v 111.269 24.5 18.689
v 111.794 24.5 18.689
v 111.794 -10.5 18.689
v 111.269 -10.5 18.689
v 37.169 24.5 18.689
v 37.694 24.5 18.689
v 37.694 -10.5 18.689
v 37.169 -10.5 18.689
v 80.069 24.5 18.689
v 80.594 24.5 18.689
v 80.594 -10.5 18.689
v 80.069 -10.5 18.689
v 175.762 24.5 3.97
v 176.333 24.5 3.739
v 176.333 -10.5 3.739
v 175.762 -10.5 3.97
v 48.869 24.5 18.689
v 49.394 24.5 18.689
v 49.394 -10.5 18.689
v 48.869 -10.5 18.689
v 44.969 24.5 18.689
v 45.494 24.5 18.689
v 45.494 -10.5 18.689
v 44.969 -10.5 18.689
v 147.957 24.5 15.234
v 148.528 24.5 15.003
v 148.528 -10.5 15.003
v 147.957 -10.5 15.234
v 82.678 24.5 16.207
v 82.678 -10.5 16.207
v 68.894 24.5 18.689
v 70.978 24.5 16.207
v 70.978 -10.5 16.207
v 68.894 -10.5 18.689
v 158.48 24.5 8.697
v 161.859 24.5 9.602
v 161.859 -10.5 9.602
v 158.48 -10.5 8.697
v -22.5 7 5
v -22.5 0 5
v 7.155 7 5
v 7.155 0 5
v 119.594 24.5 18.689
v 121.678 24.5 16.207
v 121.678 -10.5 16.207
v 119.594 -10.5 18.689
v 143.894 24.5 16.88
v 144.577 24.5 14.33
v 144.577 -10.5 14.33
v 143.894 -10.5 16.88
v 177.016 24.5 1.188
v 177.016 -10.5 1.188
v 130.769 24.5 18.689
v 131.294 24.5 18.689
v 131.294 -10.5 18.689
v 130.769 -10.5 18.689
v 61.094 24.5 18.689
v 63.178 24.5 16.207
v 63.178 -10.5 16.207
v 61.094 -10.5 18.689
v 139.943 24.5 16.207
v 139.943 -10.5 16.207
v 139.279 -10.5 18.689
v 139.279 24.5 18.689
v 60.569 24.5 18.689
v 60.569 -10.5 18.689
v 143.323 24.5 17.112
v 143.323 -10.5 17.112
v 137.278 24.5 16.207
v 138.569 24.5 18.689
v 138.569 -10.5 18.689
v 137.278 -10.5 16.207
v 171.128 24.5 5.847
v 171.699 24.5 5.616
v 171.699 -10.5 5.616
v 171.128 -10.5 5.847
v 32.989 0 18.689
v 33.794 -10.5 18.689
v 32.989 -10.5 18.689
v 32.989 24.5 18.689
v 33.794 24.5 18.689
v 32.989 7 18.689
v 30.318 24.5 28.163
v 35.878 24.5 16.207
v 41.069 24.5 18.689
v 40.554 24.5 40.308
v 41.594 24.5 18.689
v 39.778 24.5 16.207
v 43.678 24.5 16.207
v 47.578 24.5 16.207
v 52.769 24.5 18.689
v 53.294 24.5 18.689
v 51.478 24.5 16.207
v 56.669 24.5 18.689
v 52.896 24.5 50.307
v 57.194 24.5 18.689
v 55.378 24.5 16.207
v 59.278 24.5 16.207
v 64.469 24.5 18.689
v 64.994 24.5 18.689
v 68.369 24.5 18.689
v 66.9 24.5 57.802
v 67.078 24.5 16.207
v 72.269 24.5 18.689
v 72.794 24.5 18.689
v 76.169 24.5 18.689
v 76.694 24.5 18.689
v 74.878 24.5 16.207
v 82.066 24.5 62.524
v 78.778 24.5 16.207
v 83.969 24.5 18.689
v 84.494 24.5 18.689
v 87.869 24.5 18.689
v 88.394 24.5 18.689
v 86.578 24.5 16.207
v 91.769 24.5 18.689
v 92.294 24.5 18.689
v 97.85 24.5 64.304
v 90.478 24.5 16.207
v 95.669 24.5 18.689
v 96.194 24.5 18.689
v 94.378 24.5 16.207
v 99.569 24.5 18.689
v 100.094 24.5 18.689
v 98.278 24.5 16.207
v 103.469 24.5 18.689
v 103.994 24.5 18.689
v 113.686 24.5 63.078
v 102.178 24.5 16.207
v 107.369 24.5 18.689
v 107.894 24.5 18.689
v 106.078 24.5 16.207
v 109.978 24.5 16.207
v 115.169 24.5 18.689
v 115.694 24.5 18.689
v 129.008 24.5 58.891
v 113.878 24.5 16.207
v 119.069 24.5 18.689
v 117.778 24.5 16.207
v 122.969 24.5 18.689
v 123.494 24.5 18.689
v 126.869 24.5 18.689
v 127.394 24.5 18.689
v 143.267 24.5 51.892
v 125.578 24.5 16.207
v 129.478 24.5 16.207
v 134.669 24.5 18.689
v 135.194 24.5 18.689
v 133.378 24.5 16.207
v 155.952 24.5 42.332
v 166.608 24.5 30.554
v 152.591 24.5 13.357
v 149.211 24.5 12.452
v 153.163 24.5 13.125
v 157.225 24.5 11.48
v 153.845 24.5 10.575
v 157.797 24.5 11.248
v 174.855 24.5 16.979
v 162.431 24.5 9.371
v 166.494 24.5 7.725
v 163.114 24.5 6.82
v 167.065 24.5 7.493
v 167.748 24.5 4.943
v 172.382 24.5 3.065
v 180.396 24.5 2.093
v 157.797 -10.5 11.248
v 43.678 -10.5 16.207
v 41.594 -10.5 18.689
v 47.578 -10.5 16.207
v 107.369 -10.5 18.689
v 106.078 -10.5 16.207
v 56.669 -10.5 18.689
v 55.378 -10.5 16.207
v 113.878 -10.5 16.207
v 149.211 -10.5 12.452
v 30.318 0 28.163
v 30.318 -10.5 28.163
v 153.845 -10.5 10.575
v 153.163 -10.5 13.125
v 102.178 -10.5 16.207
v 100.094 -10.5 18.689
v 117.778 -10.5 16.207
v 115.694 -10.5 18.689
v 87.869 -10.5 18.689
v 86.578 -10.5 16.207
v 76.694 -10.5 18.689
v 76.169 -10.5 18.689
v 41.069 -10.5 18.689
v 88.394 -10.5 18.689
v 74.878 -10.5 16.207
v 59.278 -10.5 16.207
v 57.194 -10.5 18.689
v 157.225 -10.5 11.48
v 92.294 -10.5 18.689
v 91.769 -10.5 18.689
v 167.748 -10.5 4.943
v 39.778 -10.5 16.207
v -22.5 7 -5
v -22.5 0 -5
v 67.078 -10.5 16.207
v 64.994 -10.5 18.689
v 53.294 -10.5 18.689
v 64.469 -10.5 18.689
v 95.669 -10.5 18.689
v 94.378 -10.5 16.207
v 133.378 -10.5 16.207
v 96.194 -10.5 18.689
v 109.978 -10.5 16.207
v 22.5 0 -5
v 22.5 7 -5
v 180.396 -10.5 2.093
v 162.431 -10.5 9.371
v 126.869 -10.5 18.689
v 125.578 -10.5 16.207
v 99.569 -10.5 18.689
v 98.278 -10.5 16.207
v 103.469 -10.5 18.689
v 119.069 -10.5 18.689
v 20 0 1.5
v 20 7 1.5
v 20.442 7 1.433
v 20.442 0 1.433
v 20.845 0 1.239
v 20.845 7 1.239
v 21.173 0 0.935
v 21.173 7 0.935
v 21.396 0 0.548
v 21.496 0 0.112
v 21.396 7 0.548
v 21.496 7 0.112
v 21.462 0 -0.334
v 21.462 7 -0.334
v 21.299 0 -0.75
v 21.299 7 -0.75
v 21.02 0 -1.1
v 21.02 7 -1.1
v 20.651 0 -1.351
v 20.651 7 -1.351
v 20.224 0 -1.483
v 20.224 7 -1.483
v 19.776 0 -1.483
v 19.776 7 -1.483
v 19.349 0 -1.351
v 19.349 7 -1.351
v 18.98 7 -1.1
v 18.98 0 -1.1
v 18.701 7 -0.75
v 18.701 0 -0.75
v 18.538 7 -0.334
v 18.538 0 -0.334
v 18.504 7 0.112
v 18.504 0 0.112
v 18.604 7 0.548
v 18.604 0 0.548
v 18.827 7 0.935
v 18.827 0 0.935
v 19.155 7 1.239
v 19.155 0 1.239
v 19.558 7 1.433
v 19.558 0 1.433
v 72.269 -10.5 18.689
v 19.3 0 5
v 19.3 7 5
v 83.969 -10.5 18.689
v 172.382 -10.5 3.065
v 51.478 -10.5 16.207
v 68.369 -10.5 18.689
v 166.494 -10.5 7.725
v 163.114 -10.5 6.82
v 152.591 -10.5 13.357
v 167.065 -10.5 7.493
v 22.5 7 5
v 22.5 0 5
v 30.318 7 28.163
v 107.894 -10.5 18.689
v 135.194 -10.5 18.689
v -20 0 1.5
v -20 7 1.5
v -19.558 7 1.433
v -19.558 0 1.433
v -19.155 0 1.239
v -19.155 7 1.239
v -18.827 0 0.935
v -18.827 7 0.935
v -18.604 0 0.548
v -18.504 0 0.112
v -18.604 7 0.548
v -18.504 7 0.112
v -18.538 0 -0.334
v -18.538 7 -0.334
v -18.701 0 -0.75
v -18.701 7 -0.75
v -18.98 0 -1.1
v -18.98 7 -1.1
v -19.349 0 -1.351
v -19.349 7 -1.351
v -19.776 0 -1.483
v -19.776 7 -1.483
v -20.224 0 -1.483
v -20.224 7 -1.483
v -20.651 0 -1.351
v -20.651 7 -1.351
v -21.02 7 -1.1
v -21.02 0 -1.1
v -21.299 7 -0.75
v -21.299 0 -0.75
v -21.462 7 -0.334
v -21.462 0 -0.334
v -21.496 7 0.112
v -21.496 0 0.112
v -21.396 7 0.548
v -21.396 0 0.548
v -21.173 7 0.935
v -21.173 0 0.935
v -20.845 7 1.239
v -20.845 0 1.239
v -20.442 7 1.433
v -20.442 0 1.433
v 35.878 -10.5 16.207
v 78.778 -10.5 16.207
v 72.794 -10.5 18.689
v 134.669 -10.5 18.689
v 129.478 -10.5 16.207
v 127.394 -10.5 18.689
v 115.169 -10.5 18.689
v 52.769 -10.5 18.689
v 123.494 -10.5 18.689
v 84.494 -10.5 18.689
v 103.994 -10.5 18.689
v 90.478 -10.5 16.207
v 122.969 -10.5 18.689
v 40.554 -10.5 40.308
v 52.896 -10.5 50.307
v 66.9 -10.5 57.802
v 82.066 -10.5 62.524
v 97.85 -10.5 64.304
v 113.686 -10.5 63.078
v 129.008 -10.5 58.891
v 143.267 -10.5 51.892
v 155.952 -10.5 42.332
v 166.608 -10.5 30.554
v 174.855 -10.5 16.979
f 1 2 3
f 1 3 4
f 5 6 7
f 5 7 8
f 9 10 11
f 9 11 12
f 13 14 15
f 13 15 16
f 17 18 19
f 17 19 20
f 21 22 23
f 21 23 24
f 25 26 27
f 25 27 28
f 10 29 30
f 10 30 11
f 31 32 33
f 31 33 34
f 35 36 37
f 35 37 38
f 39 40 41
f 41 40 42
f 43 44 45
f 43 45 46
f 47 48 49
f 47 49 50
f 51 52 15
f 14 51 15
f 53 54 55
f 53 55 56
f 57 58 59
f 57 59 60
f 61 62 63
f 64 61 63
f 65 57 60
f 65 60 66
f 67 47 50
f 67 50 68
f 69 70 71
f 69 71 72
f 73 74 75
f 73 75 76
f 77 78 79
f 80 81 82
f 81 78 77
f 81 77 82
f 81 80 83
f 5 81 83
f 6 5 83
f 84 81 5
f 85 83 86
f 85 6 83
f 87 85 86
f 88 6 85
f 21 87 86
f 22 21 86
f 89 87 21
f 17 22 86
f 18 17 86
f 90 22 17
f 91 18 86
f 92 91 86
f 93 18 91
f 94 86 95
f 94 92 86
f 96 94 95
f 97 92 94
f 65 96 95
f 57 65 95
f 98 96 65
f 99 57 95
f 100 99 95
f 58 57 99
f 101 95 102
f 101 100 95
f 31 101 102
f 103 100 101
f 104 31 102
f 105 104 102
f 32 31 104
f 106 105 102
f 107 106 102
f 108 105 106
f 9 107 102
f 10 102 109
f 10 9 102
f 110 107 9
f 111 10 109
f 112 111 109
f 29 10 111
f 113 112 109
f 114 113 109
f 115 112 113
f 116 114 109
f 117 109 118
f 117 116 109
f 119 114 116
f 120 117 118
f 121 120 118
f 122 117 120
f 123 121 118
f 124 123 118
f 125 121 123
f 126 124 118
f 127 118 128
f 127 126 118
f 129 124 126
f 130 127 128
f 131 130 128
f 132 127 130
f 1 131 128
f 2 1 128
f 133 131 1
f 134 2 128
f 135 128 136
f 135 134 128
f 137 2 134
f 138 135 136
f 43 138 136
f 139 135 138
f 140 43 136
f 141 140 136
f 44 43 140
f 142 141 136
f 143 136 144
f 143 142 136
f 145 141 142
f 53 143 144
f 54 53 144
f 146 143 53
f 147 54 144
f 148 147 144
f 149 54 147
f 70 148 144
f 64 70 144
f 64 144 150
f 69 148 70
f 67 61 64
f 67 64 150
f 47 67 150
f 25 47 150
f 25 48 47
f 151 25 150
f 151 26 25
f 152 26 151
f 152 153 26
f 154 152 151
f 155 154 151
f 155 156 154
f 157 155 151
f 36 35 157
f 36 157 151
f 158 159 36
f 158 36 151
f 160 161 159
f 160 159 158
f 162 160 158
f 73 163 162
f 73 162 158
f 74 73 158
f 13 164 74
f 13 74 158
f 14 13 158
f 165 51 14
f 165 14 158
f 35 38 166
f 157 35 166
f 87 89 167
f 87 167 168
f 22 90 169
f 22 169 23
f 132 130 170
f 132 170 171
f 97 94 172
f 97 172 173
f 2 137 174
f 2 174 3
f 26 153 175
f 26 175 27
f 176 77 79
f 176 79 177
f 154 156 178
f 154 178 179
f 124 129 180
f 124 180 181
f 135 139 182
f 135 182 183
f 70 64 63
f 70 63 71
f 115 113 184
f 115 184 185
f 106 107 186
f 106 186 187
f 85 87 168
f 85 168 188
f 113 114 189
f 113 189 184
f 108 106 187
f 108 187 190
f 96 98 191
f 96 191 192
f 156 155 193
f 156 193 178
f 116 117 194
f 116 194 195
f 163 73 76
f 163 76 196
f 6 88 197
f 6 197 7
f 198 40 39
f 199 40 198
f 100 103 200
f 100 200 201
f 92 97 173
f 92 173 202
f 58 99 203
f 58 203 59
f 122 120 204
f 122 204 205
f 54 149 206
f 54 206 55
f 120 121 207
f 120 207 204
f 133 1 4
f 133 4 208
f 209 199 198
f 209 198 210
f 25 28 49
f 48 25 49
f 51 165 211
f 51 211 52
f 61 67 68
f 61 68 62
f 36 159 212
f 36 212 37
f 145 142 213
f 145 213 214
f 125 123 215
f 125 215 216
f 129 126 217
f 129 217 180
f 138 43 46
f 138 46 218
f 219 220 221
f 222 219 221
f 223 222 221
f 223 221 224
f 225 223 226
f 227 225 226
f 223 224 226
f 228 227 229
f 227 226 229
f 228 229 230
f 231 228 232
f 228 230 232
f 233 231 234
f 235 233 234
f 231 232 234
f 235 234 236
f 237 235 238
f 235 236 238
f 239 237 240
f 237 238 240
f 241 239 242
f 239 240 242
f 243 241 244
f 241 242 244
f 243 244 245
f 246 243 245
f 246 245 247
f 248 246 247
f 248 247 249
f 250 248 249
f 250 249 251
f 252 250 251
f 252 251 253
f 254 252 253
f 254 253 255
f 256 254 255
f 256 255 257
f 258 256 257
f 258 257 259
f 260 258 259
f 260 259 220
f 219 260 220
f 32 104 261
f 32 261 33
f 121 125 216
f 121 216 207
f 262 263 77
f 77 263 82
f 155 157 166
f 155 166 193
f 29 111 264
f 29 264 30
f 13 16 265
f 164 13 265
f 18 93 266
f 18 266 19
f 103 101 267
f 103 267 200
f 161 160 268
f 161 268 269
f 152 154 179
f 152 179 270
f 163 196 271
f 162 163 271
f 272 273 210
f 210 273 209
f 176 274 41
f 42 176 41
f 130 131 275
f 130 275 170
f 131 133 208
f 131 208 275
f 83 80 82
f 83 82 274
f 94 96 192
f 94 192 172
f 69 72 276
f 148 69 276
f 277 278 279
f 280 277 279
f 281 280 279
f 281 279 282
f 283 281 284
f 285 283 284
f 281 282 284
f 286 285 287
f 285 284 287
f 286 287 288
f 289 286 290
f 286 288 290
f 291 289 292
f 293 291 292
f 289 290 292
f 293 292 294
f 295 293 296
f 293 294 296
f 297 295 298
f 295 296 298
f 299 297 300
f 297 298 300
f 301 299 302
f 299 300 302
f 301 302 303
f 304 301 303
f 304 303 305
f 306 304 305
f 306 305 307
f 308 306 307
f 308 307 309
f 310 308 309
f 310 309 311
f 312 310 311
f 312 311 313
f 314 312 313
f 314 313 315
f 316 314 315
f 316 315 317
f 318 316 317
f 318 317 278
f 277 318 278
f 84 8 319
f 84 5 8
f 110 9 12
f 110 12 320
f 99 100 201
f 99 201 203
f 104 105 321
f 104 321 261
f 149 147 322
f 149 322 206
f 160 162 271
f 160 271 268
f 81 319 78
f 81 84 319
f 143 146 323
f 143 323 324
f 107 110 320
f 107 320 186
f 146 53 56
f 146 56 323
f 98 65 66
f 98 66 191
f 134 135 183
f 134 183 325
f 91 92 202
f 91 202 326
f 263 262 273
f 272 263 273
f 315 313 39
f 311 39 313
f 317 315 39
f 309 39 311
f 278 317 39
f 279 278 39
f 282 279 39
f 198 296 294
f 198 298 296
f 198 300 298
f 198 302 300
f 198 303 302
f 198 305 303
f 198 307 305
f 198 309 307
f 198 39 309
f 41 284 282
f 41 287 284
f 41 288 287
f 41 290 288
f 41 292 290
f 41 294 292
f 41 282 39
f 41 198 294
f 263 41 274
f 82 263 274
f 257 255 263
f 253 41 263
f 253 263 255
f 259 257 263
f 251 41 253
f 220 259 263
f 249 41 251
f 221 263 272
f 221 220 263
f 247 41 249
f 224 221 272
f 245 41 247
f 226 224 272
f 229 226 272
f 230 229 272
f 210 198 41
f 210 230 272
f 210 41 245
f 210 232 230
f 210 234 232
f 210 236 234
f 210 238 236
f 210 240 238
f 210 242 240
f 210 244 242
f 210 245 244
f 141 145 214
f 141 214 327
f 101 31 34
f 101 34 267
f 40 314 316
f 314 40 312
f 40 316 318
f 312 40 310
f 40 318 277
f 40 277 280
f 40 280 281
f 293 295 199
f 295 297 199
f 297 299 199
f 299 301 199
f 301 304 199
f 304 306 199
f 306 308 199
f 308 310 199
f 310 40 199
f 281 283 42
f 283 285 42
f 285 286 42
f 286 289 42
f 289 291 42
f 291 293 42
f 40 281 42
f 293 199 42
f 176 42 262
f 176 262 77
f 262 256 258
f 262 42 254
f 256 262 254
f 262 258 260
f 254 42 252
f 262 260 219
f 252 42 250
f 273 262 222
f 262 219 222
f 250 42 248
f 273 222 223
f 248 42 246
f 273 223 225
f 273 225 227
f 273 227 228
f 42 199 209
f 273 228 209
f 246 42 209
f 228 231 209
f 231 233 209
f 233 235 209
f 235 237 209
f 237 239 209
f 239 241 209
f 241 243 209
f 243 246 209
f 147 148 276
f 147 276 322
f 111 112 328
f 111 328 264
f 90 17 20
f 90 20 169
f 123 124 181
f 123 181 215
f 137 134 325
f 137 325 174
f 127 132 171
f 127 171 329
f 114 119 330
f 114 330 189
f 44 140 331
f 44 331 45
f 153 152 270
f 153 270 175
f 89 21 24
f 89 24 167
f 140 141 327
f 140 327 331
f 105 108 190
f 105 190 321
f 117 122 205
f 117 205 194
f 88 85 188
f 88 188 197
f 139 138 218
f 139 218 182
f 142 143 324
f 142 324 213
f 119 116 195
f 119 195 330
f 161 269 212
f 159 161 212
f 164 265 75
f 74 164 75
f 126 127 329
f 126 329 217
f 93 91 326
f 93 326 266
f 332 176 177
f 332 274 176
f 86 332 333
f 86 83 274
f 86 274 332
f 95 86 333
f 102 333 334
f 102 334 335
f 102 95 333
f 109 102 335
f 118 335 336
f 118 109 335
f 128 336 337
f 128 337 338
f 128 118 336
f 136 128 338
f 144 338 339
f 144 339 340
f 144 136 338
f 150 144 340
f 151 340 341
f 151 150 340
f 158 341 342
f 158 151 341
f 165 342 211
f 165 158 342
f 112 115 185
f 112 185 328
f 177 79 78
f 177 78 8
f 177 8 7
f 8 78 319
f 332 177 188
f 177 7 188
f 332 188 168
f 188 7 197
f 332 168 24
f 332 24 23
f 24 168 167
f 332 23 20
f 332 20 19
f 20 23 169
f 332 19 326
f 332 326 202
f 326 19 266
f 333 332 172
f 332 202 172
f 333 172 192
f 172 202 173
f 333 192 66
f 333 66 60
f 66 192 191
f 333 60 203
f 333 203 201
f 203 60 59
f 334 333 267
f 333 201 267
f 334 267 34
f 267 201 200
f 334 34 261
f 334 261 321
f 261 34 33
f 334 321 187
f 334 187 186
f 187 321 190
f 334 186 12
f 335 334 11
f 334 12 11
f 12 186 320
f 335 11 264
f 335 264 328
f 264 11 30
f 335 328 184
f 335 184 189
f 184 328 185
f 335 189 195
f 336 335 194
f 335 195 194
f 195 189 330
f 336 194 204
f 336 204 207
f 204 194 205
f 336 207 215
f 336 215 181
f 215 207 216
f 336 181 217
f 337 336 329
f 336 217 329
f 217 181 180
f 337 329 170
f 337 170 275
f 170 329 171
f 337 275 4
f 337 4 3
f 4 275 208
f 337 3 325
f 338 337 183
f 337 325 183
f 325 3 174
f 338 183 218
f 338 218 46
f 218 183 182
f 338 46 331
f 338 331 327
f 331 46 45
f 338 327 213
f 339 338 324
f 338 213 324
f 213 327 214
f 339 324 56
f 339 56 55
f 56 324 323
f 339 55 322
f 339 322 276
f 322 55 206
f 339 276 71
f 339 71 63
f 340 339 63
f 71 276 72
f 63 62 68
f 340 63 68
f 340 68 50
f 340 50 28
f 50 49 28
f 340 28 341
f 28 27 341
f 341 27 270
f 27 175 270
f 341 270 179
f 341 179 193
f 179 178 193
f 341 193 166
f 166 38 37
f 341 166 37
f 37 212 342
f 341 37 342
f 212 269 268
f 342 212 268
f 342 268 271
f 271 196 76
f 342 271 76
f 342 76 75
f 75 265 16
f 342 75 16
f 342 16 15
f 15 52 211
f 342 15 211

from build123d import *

# Parameters (mm, degrees)
SKETCH1_W           = 45
SKETCH1_H           = 10
BOSS_EXTRUDE1_DEPTH = 7
SKETCH2_R           = 1.5
CUT_EXTRUDE1_DEPTH  = 15
BOSS_EXTRUDE2_DEPTH = 7
BOSS_EXTRUDE3_DEPTH = 17.5


with BuildPart() as part:
    # Sketch1 → Boss-Extrude1 (new body)
    with BuildSketch(Plane(origin=(0, 0, 0), x_dir=(1, 0, 0), z_dir=(0, 1, 0))):
        Rectangle(SKETCH1_W, SKETCH1_H)
    extrude(amount=BOSS_EXTRUDE1_DEPTH)

    # Sketch2 → Cut-Extrude1 (cut)
    with BuildSketch(Plane(origin=(0, 7, 0), x_dir=(1, 0, 0), z_dir=(0, 1, 0))):
        with Locations((-20, 0)):
            Circle(SKETCH2_R)
        with Locations((20, 0)):
            Circle(SKETCH2_R)
    extrude(amount=-CUT_EXTRUDE1_DEPTH, mode=Mode.SUBTRACT)

    # Sketch5 → Boss-Extrude2 (add)
    with BuildSketch(Plane(origin=(0, 7, 0), x_dir=(1, 0, 0), z_dir=(0, 1, 0))):
        Polygon((19.2999618, -5), (32.988821569, -18.688859769), (30.31750473, -28.162976429), (7.154528301, -5), align=None)
    extrude(amount=-BOSS_EXTRUDE2_DEPTH)

    # Sketch5<6> → Boss-Extrude3 (add, symmetric)
    with BuildSketch(Plane(origin=(0, 7, 0), x_dir=(1, 0, 0), z_dir=(0, 1, 0))):
        with BuildLine():
            Line((33.794492956, -18.688859769), (32.988821569, -18.688859769))
            Line((32.988821569, -18.688859769), (30.31750473, -28.162976429))
            ThreePointArc((30.31750473, -28.162976429), (113.686282102, -63.078391798), (180.395979402, -2.092692187))
            Line((180.395979402, -2.092692187), (177.016273904, -1.1878774))
            Line((177.016273904, -1.1878774), (176.333417559, -3.738513594))
            Line((176.333417559, -3.738513594), (175.761821244, -3.970078181))
            Line((175.761821244, -3.970078181), (172.382115747, -3.065263394))
            Line((172.382115747, -3.065263394), (171.699259402, -5.615899588))
            Line((171.699259402, -5.615899588), (171.127663087, -5.847464174))
            Line((171.127663087, -5.847464174), (167.747957589, -4.942649388))
            Line((167.747957589, -4.942649388), (167.065101244, -7.493285582))
            Line((167.065101244, -7.493285582), (166.493504929, -7.724850168))
            Line((166.493504929, -7.724850168), (163.113799431, -6.820035382))
            Line((163.113799431, -6.820035382), (162.430943086, -9.370671576))
            Line((162.430943086, -9.370671576), (161.859346771, -9.602236162))
            Line((161.859346771, -9.602236162), (158.479641274, -8.697421376))
            Line((158.479641274, -8.697421376), (157.796784929, -11.24805757))
            Line((157.796784929, -11.24805757), (157.225188614, -11.479622156))
            Line((157.225188614, -11.479622156), (153.845483116, -10.57480737))
            Line((153.845483116, -10.57480737), (153.162626771, -13.125443564))
            Line((153.162626771, -13.125443564), (152.591030456, -13.35700815))
            Line((152.591030456, -13.35700815), (149.211324958, -12.452193363))
            Line((149.211324958, -12.452193363), (148.528468613, -15.002829558))
            Line((148.528468613, -15.002829558), (147.956872298, -15.234394144))
            Line((147.956872298, -15.234394144), (144.577166801, -14.329579357))
            Line((144.577166801, -14.329579357), (143.894310456, -16.880215552))
            Line((143.894310456, -16.880215552), (143.322714141, -17.111780138))
            Line((143.322714141, -17.111780138), (139.943008643, -16.206965351))
            Line((139.943008643, -16.206965351), (139.278555847, -18.688859769))
            Line((139.278555847, -18.688859769), (138.569191128, -18.688859769))
            Line((138.569191128, -18.688859769), (137.277695253, -16.206965351))
            Line((137.277695253, -16.206965351), (135.194492956, -18.688859769))
            Line((135.194492956, -18.688859769), (134.669191128, -18.688859769))
            Line((134.669191128, -18.688859769), (133.377695253, -16.206965351))
            Line((133.377695253, -16.206965351), (131.294492956, -18.688859769))
            Line((131.294492956, -18.688859769), (130.769191128, -18.688859769))
            Line((130.769191128, -18.688859769), (129.477695253, -16.206965351))
            Line((129.477695253, -16.206965351), (127.394492956, -18.688859769))
            Line((127.394492956, -18.688859769), (126.869191128, -18.688859769))
            Line((126.869191128, -18.688859769), (125.577695253, -16.206965351))
            Line((125.577695253, -16.206965351), (123.494492956, -18.688859769))
            Line((123.494492956, -18.688859769), (122.969191128, -18.688859769))
            Line((122.969191128, -18.688859769), (121.677695253, -16.206965351))
            Line((121.677695253, -16.206965351), (119.594492956, -18.688859769))
            Line((119.594492956, -18.688859769), (119.069191128, -18.688859769))
            Line((119.069191128, -18.688859769), (117.777695253, -16.206965351))
            Line((117.777695253, -16.206965351), (115.694492956, -18.688859769))
            Line((115.694492956, -18.688859769), (115.169191128, -18.688859769))
            Line((115.169191128, -18.688859769), (113.877695253, -16.206965351))
            Line((113.877695253, -16.206965351), (111.794492956, -18.688859769))
            Line((111.794492956, -18.688859769), (111.269191128, -18.688859769))
            Line((111.269191128, -18.688859769), (109.977695253, -16.206965351))
            Line((109.977695253, -16.206965351), (107.894492956, -18.688859769))
            Line((107.894492956, -18.688859769), (107.369191128, -18.688859769))
            Line((107.369191128, -18.688859769), (106.077695253, -16.206965351))
            Line((106.077695253, -16.206965351), (103.994492956, -18.688859769))
            Line((103.994492956, -18.688859769), (103.469191128, -18.688859769))
            Line((103.469191128, -18.688859769), (102.177695253, -16.206965351))
            Line((102.177695253, -16.206965351), (100.094492956, -18.688859769))
            Line((100.094492956, -18.688859769), (99.569191128, -18.688859769))
            Line((99.569191128, -18.688859769), (98.277695253, -16.206965351))
            Line((98.277695253, -16.206965351), (96.194492956, -18.688859769))
            Line((96.194492956, -18.688859769), (95.669191128, -18.688859769))
            Line((95.669191128, -18.688859769), (94.377695253, -16.206965351))
            Line((94.377695253, -16.206965351), (92.294492956, -18.688859769))
            Line((92.294492956, -18.688859769), (91.769191128, -18.688859769))
            Line((91.769191128, -18.688859769), (90.477695253, -16.206965351))
            Line((90.477695253, -16.206965351), (88.394492956, -18.688859769))
            Line((88.394492956, -18.688859769), (87.869191128, -18.688859769))
            Line((87.869191128, -18.688859769), (86.577695253, -16.206965351))
            Line((86.577695253, -16.206965351), (84.494492956, -18.688859769))
            Line((84.494492956, -18.688859769), (83.969191128, -18.688859769))
            Line((83.969191128, -18.688859769), (82.677695253, -16.206965351))
            Line((82.677695253, -16.206965351), (80.594492956, -18.688859769))
            Line((80.594492956, -18.688859769), (80.069191128, -18.688859769))
            Line((80.069191128, -18.688859769), (78.777695253, -16.206965351))
            Line((78.777695253, -16.206965351), (76.694492956, -18.688859769))
            Line((76.694492956, -18.688859769), (76.169191128, -18.688859769))
            Line((76.169191128, -18.688859769), (74.877695253, -16.206965351))
            Line((74.877695253, -16.206965351), (72.794492956, -18.688859769))
            Line((72.794492956, -18.688859769), (72.269191128, -18.688859769))
            Line((72.269191128, -18.688859769), (70.977695253, -16.206965351))
            Line((70.977695253, -16.206965351), (68.894492956, -18.688859769))
            Line((68.894492956, -18.688859769), (68.369191128, -18.688859769))
            Line((68.369191128, -18.688859769), (67.077695253, -16.206965351))
            Line((67.077695253, -16.206965351), (64.994492956, -18.688859769))
            Line((64.994492956, -18.688859769), (64.469191128, -18.688859769))
            Line((64.469191128, -18.688859769), (63.177695253, -16.206965351))
            Line((63.177695253, -16.206965351), (61.094492956, -18.688859769))
            Line((61.094492956, -18.688859769), (60.569191128, -18.688859769))
            Line((60.569191128, -18.688859769), (59.277695253, -16.206965351))
            Line((59.277695253, -16.206965351), (57.194492956, -18.688859769))
            Line((57.194492956, -18.688859769), (56.669191128, -18.688859769))
            Line((56.669191128, -18.688859769), (55.377695253, -16.206965351))
            Line((55.377695253, -16.206965351), (53.294492956, -18.688859769))
            Line((53.294492956, -18.688859769), (52.769191128, -18.688859769))
            Line((52.769191128, -18.688859769), (51.477695253, -16.206965351))
            Line((51.477695253, -16.206965351), (49.394492956, -18.688859769))
            Line((49.394492956, -18.688859769), (48.869191128, -18.688859769))
            Line((48.869191128, -18.688859769), (47.577695253, -16.206965351))
            Line((47.577695253, -16.206965351), (45.494492956, -18.688859769))
            Line((45.494492956, -18.688859769), (44.969191128, -18.688859769))
            Line((44.969191128, -18.688859769), (43.677695253, -16.206965351))
            Line((43.677695253, -16.206965351), (41.594492956, -18.688859769))
            Line((41.594492956, -18.688859769), (41.069191128, -18.688859769))
            Line((41.069191128, -18.688859769), (39.777695253, -16.206965351))
            Line((39.777695253, -16.206965351), (37.694492956, -18.688859769))
            Line((37.694492956, -18.688859769), (37.169191128, -18.688859769))
            Line((37.169191128, -18.688859769), (35.877695253, -16.206965351))
            Line((35.877695253, -16.206965351), (33.794492956, -18.688859769))
        make_face()
    extrude(amount=BOSS_EXTRUDE3_DEPTH, both=True)


solid = part.part
